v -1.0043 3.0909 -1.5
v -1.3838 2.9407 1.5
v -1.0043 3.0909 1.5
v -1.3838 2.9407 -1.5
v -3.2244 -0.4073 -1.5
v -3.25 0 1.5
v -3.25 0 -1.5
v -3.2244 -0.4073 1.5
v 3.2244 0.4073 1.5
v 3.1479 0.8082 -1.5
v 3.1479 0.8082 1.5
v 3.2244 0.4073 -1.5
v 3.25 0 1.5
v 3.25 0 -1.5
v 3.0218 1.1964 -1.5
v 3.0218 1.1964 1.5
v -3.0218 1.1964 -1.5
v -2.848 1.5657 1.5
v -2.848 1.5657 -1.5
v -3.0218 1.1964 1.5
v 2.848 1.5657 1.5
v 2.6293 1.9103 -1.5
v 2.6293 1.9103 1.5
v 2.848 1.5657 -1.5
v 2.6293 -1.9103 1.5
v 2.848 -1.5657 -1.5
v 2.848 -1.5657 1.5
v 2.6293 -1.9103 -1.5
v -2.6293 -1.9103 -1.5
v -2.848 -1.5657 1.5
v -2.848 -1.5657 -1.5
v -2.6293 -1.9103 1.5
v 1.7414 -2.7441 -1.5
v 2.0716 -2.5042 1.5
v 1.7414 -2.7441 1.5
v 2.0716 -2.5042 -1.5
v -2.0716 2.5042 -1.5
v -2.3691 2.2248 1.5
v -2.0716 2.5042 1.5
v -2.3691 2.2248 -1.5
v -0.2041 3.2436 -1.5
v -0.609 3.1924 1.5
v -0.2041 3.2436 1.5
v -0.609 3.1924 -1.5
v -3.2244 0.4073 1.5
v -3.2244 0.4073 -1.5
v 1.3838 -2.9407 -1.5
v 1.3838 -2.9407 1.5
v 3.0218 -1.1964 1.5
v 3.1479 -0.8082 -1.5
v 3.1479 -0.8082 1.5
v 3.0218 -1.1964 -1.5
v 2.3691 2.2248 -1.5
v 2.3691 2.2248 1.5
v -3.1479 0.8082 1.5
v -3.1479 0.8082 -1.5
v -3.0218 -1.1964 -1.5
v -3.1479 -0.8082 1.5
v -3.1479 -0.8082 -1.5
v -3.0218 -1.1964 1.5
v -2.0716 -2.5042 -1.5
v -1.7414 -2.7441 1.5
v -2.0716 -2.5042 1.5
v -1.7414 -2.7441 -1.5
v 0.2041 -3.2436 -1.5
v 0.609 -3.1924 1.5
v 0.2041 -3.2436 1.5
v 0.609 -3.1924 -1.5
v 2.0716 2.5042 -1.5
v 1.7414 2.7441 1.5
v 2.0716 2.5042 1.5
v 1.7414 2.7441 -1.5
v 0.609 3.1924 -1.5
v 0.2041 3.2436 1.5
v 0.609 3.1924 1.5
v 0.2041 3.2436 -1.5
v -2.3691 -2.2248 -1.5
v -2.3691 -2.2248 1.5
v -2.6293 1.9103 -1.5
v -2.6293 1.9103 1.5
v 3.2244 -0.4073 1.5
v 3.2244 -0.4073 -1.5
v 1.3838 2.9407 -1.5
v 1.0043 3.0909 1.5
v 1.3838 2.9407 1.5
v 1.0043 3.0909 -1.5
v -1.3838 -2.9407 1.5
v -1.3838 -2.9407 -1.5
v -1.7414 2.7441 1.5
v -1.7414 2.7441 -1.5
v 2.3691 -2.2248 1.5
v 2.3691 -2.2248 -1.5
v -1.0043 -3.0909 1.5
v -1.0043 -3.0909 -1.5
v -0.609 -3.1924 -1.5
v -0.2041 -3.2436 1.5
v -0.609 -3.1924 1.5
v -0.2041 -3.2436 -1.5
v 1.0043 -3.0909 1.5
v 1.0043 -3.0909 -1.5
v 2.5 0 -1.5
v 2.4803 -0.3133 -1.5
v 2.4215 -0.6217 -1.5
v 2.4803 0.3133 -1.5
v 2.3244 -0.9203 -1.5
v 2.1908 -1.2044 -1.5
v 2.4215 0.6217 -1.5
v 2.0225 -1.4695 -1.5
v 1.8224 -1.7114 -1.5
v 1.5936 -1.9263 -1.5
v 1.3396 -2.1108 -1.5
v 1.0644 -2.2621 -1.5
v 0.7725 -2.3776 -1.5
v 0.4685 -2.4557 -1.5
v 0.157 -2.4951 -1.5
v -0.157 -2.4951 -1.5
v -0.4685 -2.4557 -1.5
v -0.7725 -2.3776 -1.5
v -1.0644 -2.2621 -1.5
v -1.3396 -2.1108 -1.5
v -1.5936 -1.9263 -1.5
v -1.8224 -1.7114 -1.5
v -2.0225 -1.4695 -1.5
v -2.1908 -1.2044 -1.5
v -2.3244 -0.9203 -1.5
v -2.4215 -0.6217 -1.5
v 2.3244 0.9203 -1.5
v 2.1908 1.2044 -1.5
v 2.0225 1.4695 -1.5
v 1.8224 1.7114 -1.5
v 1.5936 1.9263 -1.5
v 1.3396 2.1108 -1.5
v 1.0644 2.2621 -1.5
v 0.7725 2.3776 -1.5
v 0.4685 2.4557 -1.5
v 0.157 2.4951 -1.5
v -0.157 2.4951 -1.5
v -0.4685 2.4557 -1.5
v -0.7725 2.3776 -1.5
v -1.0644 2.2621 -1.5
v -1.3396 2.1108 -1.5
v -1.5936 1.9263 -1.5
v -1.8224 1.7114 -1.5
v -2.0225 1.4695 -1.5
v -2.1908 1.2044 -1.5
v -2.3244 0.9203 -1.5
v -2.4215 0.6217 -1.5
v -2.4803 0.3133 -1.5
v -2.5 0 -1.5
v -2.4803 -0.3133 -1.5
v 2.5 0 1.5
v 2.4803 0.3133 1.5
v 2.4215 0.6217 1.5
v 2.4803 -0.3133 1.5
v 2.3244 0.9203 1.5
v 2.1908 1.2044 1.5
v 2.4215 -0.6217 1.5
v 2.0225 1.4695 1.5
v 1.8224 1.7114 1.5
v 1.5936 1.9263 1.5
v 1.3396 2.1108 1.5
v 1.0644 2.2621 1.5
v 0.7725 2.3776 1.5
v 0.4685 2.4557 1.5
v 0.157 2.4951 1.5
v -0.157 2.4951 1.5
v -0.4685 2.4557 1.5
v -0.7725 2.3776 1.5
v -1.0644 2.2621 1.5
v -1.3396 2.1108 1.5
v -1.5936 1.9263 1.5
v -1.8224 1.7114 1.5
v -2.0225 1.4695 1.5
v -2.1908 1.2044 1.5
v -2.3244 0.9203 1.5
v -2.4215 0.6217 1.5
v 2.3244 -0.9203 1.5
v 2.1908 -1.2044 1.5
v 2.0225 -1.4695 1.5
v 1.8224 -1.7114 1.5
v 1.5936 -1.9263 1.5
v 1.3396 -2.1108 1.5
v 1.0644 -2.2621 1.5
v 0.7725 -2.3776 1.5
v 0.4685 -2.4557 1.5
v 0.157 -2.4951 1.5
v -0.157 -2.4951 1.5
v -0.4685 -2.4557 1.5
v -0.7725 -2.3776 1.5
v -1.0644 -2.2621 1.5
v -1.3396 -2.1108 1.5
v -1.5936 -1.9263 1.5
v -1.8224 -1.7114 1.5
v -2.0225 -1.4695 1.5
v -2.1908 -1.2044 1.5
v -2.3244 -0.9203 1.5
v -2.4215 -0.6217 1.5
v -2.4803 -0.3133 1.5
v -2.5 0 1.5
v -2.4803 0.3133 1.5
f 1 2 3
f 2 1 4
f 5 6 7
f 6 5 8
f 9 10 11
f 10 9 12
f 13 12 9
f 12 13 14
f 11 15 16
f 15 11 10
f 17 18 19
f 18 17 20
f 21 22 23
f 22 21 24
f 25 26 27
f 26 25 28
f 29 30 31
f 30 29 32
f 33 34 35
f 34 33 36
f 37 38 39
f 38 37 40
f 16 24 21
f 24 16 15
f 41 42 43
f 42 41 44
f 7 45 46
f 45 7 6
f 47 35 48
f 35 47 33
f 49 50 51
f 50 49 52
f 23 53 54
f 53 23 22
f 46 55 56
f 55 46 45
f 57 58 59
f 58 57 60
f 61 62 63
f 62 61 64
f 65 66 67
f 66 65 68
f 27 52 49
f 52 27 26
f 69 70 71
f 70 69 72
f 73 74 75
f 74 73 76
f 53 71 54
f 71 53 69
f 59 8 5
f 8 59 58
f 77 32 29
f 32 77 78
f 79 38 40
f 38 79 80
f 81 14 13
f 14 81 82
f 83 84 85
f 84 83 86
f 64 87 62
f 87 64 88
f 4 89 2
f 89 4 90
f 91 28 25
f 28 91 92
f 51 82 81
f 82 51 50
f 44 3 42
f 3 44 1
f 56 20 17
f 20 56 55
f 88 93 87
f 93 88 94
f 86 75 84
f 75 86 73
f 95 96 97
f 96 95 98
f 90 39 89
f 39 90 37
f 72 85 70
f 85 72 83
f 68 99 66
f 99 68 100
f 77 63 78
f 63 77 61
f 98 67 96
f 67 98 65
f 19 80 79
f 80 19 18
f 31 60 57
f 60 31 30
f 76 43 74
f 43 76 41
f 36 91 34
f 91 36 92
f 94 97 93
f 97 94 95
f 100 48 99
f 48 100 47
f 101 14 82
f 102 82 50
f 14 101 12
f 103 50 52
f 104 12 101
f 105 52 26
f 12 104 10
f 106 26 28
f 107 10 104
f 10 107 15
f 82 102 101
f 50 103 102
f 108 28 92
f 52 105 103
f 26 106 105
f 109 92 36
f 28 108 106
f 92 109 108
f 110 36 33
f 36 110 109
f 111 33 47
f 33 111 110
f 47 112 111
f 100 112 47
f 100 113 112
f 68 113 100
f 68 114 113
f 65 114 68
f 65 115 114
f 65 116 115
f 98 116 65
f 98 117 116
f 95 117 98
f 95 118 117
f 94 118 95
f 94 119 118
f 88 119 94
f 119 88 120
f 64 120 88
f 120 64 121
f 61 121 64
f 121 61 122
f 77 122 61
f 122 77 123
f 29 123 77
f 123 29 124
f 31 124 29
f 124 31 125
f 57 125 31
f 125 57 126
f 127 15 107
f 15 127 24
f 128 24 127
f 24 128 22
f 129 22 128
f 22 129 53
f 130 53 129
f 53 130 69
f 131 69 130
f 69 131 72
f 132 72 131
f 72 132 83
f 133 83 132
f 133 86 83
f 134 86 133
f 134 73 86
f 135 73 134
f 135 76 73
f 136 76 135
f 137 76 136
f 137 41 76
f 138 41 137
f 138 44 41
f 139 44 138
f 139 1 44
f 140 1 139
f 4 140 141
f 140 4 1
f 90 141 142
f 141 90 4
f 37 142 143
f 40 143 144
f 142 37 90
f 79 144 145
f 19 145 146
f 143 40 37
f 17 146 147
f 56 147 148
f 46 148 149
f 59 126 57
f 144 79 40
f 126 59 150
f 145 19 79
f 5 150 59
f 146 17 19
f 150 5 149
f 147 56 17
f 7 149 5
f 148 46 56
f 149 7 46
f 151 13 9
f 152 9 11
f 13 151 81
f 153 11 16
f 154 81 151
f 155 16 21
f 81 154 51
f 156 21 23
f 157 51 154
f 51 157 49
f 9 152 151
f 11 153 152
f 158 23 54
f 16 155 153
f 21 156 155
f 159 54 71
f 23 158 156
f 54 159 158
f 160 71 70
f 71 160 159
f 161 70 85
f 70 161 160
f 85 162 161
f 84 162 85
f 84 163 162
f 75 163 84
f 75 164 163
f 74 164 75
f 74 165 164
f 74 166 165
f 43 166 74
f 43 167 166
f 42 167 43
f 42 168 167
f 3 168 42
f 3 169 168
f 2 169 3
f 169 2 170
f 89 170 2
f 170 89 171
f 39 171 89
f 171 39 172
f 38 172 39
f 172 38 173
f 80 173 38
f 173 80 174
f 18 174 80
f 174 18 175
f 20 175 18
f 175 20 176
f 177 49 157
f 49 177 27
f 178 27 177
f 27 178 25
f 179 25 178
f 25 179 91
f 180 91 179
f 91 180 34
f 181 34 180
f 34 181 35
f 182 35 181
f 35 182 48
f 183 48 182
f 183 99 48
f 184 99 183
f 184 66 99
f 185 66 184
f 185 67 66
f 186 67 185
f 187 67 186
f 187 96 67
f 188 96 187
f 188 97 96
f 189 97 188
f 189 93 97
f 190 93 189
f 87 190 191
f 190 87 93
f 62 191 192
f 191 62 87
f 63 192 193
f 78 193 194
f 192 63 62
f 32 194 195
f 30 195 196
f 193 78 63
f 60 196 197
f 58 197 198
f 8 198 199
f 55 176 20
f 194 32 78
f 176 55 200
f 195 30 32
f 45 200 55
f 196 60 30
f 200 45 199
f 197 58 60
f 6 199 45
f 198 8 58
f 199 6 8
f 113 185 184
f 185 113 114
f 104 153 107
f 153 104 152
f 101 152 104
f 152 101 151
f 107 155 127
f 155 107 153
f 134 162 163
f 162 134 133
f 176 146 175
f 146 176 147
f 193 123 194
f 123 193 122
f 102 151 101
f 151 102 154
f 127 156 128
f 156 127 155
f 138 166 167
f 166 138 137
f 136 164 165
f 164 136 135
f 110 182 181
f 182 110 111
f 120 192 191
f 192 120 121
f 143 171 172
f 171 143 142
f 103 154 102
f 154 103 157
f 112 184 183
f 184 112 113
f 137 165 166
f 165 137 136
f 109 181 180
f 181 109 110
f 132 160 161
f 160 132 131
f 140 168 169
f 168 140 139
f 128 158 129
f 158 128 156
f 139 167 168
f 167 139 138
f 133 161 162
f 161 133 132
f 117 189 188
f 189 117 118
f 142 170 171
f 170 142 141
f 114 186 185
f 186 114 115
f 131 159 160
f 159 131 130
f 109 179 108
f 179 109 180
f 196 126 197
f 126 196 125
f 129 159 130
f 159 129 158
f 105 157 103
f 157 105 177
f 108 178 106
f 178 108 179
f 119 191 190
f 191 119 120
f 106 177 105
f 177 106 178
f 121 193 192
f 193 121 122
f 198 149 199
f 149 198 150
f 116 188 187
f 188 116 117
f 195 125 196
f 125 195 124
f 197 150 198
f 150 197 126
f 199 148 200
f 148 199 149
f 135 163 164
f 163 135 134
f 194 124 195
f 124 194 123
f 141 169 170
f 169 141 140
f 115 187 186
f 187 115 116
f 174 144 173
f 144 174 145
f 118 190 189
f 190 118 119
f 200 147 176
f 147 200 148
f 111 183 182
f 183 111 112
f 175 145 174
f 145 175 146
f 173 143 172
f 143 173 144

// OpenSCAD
$fn = 50;


difference() {
	union() {
		translate(v = [0, 0, -1.5000000000]) {
			cylinder(h = 3, r = 3.2500000000);
		}
	}
	union() {
		translate(v = [0, 0, -100.0000000000]) {
			cylinder(h = 200, r = 2.5000000000);
		}
	}
}
